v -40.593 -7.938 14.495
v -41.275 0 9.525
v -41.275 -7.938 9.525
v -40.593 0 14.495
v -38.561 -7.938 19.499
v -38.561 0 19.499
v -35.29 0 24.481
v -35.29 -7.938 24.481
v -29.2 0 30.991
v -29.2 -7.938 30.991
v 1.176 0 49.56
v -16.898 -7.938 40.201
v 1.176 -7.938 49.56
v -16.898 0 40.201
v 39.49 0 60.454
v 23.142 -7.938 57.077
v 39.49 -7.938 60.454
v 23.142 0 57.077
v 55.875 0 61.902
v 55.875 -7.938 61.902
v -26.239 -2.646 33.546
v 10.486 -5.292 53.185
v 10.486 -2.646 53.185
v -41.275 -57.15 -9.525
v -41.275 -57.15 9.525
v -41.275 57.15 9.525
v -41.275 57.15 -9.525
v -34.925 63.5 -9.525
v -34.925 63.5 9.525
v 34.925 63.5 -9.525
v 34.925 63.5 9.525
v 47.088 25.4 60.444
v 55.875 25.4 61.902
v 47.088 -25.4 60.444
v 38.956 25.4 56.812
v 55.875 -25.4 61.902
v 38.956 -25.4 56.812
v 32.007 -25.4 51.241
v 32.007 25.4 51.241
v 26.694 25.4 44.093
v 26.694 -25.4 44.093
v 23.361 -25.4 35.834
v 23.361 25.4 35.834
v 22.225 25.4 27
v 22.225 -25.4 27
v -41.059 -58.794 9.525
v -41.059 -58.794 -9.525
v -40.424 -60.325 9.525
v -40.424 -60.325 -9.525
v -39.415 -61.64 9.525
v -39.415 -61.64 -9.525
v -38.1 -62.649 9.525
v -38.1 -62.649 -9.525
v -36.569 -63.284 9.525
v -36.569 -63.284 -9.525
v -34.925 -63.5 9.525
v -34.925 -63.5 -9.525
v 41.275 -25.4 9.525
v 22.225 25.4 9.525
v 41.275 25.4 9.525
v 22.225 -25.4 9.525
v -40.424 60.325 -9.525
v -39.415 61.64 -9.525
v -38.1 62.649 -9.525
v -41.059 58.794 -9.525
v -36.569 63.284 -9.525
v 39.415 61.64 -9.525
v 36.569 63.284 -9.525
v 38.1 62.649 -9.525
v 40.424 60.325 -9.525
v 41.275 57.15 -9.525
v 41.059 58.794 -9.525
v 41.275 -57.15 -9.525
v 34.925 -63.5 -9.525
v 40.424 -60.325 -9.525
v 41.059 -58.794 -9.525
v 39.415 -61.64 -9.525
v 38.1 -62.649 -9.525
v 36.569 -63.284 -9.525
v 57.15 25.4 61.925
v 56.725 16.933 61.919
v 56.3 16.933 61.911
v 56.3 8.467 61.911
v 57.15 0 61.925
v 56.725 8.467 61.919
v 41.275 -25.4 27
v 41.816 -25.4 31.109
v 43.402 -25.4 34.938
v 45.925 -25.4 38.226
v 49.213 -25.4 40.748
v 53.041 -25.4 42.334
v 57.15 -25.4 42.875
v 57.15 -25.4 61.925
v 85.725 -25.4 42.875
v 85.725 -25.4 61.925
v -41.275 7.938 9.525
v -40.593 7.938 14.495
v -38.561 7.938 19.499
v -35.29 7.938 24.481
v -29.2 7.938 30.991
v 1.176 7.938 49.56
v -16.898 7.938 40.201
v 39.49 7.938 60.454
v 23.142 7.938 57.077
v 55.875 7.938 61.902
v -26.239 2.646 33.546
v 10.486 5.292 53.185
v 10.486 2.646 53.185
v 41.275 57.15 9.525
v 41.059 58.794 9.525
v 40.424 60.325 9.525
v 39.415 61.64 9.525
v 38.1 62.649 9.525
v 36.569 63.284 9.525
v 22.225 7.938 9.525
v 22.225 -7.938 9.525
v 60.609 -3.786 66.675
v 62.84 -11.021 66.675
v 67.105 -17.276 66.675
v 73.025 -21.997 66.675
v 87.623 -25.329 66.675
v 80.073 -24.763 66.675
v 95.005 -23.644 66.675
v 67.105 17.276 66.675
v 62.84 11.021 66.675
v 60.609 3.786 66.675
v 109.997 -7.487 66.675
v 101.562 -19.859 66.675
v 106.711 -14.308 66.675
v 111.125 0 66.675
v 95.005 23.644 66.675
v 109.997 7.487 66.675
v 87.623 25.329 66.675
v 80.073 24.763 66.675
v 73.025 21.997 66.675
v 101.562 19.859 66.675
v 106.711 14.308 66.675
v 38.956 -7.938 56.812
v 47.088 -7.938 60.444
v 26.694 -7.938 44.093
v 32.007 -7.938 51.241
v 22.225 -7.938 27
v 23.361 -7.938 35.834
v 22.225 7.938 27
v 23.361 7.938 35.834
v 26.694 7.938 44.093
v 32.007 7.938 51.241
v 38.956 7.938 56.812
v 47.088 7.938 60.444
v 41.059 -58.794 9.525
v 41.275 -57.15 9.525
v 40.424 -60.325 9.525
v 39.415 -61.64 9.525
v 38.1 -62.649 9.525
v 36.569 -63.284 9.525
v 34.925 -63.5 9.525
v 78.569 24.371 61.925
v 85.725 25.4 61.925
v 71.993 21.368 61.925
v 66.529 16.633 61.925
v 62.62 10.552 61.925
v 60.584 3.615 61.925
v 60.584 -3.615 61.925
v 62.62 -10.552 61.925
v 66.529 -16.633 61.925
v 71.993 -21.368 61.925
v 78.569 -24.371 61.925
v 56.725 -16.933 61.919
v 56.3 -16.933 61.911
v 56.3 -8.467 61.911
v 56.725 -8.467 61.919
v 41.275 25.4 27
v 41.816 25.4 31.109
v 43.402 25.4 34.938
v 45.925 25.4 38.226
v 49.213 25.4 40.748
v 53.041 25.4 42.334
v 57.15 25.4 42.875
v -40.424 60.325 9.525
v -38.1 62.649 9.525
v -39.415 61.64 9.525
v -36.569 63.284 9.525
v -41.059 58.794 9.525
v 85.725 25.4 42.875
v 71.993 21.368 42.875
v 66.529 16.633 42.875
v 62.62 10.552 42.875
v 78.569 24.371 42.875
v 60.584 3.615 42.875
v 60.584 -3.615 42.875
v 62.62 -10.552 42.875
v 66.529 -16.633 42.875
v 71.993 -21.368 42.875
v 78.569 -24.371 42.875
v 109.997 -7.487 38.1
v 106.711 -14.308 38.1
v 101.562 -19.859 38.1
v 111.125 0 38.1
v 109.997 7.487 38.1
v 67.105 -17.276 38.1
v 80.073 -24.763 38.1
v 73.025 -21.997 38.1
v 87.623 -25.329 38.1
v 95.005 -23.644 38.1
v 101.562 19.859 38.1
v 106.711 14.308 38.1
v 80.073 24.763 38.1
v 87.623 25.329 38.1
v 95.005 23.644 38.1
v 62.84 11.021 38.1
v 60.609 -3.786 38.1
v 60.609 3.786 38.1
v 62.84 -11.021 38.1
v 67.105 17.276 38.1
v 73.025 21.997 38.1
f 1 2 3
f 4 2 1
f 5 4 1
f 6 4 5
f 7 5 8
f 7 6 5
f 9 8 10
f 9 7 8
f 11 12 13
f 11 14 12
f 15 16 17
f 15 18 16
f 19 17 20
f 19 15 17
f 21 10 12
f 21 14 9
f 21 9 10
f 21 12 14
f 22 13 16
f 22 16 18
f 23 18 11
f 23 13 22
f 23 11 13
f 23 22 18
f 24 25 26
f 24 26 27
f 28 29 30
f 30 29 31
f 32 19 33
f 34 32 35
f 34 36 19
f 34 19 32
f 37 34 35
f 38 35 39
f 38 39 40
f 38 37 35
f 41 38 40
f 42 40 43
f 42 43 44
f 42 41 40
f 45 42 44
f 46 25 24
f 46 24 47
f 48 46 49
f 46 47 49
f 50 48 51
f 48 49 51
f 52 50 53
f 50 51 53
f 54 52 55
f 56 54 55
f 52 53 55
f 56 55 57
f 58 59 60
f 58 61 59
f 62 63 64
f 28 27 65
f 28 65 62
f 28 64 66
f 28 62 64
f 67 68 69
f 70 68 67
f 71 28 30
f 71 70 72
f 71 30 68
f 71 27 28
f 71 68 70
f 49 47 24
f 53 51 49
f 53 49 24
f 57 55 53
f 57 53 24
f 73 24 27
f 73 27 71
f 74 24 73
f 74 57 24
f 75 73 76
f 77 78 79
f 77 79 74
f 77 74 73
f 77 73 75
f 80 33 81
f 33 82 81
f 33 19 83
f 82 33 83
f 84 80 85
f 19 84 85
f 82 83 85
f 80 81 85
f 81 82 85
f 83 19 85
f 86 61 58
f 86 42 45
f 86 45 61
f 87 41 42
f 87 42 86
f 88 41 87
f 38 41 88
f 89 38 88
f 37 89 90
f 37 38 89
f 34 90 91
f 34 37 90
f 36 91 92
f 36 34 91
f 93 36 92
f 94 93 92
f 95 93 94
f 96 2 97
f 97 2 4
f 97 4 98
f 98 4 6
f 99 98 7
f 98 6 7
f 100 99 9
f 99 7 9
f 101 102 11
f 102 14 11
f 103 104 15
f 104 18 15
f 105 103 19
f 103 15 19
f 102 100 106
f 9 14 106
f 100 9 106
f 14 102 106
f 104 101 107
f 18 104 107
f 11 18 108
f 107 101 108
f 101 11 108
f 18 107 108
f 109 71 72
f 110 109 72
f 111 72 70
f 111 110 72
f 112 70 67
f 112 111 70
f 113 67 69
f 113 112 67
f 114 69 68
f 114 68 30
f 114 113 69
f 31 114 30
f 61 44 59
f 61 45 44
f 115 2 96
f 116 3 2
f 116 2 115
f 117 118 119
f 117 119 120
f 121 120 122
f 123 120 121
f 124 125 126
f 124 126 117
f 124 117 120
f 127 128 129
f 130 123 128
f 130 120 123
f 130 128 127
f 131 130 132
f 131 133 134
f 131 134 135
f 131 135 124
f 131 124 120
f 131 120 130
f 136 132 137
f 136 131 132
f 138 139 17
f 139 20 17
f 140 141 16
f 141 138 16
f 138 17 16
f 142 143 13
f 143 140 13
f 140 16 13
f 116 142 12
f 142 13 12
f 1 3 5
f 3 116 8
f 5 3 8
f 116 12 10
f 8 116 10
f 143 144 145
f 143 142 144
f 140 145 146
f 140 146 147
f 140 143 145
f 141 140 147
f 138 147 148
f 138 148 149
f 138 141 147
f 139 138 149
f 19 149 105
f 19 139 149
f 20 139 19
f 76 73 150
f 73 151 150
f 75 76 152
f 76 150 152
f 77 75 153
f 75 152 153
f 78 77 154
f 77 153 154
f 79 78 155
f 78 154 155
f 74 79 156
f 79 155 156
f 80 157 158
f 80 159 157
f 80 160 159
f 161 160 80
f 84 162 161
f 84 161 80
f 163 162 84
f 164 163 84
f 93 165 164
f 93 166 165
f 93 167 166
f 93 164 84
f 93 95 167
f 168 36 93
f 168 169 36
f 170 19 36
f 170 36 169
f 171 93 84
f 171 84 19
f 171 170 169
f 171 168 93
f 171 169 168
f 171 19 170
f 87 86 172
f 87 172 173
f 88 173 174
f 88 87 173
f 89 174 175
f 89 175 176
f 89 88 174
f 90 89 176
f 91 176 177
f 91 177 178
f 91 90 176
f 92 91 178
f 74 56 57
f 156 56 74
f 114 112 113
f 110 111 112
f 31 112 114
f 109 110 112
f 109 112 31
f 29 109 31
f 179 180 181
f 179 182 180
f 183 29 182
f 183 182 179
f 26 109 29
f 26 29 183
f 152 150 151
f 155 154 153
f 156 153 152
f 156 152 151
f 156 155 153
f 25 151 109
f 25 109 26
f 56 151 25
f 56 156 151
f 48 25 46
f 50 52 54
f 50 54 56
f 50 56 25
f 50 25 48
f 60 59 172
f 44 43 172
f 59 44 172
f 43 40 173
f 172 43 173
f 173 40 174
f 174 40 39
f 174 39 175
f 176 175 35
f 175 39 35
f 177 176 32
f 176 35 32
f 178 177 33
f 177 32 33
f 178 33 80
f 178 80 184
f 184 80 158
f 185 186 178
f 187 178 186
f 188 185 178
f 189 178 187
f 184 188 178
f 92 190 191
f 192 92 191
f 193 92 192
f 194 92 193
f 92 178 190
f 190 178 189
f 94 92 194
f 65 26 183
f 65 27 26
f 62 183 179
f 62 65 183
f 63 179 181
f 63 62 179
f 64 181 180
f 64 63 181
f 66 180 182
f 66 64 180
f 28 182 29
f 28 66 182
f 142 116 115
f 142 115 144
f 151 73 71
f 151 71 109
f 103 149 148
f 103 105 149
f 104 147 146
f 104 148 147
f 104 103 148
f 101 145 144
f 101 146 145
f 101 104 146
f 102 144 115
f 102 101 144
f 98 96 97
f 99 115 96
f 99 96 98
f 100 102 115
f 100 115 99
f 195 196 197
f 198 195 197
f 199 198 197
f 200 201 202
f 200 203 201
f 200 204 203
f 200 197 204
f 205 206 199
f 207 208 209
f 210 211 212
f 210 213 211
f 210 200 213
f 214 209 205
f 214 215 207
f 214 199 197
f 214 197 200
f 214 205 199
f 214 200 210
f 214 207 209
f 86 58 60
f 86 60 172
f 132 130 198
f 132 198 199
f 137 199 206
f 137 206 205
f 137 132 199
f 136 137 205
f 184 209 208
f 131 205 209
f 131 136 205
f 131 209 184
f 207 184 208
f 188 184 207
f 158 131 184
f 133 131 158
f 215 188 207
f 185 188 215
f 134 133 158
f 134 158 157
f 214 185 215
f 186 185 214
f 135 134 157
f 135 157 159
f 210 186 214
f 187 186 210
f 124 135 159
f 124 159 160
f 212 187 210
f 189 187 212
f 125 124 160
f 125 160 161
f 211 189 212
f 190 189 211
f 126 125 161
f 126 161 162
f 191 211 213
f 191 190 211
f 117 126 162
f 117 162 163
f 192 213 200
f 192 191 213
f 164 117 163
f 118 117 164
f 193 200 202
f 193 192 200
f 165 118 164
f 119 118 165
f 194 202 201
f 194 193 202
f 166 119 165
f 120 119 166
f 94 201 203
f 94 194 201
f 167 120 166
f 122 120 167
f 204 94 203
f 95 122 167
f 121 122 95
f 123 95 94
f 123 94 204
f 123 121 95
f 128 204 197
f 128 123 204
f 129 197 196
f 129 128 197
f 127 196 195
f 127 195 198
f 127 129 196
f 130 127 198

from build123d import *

# Parameters (mm, degrees)
F1_DEPTH = 63.5
F0_W     = 25.4
F0_H     = 19.05
F2_DEPTH = 25.4
F3_DEPTH = 7.9375
F5_R     = 6.35


with BuildPart() as f1:
    # F0 (on Front) → F1 (new body, symmetric)
    with BuildSketch(Plane.XZ):
        Polygon((-41.275, 9.525), (-41.275, -9.525), (41.275, -9.525), (41.275, 9.525), (22.225, 9.525), align=None)
    extrude(amount=F1_DEPTH, both=True)

    # F5
    f5_edges = [f1.edges().sort_by_distance(p)[0] for p in [
        (41.275, -63.5, 0),
        (-41.275, -63.5, 0),
        (41.275, 63.5, 0),
        (-41.275, 63.5, 0),
    ]]
    fillet(f5_edges, radius=F5_R)


with BuildPart() as f2:
    # F0 (on Front) → F2 (new body, symmetric)
    with BuildSketch(Plane.XZ):
        with BuildLine():
            Line((22.225, 9.525), (41.275, 9.525))
            Line((41.275, 9.525), (41.275, 27.0002))
            ThreePointArc((41.275, 27.0002), (45.9246798487, 38.2255201513), (57.15, 42.8752))
            Line((57.15, 42.8752), (60.325, 42.8752))
            Line((60.325, 42.8752), (60.325, 61.9252))
            Line((60.325, 61.9252), (57.15, 61.9252))
            add(Edge.make_bspline(
                [(55.8745981031, 61.9019044713), (56.3003238087, 61.9119834463), (56.7254739052, 61.919756725), (57.15, 61.9252)],
                knots=[110.4681868296, 110.4681868296, 110.4681868296, 110.4681868296, 111.5045361635, 111.5045361635, 111.5045361635, 111.5045361635], degree=3))
            ThreePointArc((55.8745981031, 61.9019044713), (32.0074162401, 51.240788006), (22.225, 27.0002))
            Line((22.225, 27.0002), (22.225, 9.525))
        make_face()
        with Locations((73.025, 52.4002)):
            Rectangle(F0_W, F0_H)
    extrude(amount=F2_DEPTH, both=True)

    # F0 (on Front) → F4 (revolve)
    with BuildSketch(Plane.XZ):
        Polygon((85.725, 66.675), (85.725, 61.9252), (85.725, 42.8752), (85.725, 38.1), (111.125, 38.1), (111.125, 66.675), align=None)
    revolve(axis=Axis((85.725, 0, 52.3875), (0, 0, 1)))


with BuildPart() as f3:
    # F0 (on Front) → F3 (new body, symmetric)
    with BuildSketch(Plane.XZ):
        with BuildLine():
            add(Edge.make_bspline(
                [(-41.275, 9.525), (-41.4248394155, 33.5554330459), (10.494970545, 60.8275504321), (55.8745981031, 61.9019044713)],
                knots=[0, 0, 0, 0, 110.4681868296, 110.4681868296, 110.4681868296, 110.4681868296], degree=3))
            Line((-41.275, 9.525), (22.225, 9.525))
            Line((22.225, 9.525), (22.225, 27.0002))
            ThreePointArc((22.225, 27.0002), (32.0074162401, 51.240788006), (55.8745981031, 61.9019044713))
        make_face()
    extrude(amount=F3_DEPTH, both=True)


solid = Compound([f1.part, f2.part, f3.part])
